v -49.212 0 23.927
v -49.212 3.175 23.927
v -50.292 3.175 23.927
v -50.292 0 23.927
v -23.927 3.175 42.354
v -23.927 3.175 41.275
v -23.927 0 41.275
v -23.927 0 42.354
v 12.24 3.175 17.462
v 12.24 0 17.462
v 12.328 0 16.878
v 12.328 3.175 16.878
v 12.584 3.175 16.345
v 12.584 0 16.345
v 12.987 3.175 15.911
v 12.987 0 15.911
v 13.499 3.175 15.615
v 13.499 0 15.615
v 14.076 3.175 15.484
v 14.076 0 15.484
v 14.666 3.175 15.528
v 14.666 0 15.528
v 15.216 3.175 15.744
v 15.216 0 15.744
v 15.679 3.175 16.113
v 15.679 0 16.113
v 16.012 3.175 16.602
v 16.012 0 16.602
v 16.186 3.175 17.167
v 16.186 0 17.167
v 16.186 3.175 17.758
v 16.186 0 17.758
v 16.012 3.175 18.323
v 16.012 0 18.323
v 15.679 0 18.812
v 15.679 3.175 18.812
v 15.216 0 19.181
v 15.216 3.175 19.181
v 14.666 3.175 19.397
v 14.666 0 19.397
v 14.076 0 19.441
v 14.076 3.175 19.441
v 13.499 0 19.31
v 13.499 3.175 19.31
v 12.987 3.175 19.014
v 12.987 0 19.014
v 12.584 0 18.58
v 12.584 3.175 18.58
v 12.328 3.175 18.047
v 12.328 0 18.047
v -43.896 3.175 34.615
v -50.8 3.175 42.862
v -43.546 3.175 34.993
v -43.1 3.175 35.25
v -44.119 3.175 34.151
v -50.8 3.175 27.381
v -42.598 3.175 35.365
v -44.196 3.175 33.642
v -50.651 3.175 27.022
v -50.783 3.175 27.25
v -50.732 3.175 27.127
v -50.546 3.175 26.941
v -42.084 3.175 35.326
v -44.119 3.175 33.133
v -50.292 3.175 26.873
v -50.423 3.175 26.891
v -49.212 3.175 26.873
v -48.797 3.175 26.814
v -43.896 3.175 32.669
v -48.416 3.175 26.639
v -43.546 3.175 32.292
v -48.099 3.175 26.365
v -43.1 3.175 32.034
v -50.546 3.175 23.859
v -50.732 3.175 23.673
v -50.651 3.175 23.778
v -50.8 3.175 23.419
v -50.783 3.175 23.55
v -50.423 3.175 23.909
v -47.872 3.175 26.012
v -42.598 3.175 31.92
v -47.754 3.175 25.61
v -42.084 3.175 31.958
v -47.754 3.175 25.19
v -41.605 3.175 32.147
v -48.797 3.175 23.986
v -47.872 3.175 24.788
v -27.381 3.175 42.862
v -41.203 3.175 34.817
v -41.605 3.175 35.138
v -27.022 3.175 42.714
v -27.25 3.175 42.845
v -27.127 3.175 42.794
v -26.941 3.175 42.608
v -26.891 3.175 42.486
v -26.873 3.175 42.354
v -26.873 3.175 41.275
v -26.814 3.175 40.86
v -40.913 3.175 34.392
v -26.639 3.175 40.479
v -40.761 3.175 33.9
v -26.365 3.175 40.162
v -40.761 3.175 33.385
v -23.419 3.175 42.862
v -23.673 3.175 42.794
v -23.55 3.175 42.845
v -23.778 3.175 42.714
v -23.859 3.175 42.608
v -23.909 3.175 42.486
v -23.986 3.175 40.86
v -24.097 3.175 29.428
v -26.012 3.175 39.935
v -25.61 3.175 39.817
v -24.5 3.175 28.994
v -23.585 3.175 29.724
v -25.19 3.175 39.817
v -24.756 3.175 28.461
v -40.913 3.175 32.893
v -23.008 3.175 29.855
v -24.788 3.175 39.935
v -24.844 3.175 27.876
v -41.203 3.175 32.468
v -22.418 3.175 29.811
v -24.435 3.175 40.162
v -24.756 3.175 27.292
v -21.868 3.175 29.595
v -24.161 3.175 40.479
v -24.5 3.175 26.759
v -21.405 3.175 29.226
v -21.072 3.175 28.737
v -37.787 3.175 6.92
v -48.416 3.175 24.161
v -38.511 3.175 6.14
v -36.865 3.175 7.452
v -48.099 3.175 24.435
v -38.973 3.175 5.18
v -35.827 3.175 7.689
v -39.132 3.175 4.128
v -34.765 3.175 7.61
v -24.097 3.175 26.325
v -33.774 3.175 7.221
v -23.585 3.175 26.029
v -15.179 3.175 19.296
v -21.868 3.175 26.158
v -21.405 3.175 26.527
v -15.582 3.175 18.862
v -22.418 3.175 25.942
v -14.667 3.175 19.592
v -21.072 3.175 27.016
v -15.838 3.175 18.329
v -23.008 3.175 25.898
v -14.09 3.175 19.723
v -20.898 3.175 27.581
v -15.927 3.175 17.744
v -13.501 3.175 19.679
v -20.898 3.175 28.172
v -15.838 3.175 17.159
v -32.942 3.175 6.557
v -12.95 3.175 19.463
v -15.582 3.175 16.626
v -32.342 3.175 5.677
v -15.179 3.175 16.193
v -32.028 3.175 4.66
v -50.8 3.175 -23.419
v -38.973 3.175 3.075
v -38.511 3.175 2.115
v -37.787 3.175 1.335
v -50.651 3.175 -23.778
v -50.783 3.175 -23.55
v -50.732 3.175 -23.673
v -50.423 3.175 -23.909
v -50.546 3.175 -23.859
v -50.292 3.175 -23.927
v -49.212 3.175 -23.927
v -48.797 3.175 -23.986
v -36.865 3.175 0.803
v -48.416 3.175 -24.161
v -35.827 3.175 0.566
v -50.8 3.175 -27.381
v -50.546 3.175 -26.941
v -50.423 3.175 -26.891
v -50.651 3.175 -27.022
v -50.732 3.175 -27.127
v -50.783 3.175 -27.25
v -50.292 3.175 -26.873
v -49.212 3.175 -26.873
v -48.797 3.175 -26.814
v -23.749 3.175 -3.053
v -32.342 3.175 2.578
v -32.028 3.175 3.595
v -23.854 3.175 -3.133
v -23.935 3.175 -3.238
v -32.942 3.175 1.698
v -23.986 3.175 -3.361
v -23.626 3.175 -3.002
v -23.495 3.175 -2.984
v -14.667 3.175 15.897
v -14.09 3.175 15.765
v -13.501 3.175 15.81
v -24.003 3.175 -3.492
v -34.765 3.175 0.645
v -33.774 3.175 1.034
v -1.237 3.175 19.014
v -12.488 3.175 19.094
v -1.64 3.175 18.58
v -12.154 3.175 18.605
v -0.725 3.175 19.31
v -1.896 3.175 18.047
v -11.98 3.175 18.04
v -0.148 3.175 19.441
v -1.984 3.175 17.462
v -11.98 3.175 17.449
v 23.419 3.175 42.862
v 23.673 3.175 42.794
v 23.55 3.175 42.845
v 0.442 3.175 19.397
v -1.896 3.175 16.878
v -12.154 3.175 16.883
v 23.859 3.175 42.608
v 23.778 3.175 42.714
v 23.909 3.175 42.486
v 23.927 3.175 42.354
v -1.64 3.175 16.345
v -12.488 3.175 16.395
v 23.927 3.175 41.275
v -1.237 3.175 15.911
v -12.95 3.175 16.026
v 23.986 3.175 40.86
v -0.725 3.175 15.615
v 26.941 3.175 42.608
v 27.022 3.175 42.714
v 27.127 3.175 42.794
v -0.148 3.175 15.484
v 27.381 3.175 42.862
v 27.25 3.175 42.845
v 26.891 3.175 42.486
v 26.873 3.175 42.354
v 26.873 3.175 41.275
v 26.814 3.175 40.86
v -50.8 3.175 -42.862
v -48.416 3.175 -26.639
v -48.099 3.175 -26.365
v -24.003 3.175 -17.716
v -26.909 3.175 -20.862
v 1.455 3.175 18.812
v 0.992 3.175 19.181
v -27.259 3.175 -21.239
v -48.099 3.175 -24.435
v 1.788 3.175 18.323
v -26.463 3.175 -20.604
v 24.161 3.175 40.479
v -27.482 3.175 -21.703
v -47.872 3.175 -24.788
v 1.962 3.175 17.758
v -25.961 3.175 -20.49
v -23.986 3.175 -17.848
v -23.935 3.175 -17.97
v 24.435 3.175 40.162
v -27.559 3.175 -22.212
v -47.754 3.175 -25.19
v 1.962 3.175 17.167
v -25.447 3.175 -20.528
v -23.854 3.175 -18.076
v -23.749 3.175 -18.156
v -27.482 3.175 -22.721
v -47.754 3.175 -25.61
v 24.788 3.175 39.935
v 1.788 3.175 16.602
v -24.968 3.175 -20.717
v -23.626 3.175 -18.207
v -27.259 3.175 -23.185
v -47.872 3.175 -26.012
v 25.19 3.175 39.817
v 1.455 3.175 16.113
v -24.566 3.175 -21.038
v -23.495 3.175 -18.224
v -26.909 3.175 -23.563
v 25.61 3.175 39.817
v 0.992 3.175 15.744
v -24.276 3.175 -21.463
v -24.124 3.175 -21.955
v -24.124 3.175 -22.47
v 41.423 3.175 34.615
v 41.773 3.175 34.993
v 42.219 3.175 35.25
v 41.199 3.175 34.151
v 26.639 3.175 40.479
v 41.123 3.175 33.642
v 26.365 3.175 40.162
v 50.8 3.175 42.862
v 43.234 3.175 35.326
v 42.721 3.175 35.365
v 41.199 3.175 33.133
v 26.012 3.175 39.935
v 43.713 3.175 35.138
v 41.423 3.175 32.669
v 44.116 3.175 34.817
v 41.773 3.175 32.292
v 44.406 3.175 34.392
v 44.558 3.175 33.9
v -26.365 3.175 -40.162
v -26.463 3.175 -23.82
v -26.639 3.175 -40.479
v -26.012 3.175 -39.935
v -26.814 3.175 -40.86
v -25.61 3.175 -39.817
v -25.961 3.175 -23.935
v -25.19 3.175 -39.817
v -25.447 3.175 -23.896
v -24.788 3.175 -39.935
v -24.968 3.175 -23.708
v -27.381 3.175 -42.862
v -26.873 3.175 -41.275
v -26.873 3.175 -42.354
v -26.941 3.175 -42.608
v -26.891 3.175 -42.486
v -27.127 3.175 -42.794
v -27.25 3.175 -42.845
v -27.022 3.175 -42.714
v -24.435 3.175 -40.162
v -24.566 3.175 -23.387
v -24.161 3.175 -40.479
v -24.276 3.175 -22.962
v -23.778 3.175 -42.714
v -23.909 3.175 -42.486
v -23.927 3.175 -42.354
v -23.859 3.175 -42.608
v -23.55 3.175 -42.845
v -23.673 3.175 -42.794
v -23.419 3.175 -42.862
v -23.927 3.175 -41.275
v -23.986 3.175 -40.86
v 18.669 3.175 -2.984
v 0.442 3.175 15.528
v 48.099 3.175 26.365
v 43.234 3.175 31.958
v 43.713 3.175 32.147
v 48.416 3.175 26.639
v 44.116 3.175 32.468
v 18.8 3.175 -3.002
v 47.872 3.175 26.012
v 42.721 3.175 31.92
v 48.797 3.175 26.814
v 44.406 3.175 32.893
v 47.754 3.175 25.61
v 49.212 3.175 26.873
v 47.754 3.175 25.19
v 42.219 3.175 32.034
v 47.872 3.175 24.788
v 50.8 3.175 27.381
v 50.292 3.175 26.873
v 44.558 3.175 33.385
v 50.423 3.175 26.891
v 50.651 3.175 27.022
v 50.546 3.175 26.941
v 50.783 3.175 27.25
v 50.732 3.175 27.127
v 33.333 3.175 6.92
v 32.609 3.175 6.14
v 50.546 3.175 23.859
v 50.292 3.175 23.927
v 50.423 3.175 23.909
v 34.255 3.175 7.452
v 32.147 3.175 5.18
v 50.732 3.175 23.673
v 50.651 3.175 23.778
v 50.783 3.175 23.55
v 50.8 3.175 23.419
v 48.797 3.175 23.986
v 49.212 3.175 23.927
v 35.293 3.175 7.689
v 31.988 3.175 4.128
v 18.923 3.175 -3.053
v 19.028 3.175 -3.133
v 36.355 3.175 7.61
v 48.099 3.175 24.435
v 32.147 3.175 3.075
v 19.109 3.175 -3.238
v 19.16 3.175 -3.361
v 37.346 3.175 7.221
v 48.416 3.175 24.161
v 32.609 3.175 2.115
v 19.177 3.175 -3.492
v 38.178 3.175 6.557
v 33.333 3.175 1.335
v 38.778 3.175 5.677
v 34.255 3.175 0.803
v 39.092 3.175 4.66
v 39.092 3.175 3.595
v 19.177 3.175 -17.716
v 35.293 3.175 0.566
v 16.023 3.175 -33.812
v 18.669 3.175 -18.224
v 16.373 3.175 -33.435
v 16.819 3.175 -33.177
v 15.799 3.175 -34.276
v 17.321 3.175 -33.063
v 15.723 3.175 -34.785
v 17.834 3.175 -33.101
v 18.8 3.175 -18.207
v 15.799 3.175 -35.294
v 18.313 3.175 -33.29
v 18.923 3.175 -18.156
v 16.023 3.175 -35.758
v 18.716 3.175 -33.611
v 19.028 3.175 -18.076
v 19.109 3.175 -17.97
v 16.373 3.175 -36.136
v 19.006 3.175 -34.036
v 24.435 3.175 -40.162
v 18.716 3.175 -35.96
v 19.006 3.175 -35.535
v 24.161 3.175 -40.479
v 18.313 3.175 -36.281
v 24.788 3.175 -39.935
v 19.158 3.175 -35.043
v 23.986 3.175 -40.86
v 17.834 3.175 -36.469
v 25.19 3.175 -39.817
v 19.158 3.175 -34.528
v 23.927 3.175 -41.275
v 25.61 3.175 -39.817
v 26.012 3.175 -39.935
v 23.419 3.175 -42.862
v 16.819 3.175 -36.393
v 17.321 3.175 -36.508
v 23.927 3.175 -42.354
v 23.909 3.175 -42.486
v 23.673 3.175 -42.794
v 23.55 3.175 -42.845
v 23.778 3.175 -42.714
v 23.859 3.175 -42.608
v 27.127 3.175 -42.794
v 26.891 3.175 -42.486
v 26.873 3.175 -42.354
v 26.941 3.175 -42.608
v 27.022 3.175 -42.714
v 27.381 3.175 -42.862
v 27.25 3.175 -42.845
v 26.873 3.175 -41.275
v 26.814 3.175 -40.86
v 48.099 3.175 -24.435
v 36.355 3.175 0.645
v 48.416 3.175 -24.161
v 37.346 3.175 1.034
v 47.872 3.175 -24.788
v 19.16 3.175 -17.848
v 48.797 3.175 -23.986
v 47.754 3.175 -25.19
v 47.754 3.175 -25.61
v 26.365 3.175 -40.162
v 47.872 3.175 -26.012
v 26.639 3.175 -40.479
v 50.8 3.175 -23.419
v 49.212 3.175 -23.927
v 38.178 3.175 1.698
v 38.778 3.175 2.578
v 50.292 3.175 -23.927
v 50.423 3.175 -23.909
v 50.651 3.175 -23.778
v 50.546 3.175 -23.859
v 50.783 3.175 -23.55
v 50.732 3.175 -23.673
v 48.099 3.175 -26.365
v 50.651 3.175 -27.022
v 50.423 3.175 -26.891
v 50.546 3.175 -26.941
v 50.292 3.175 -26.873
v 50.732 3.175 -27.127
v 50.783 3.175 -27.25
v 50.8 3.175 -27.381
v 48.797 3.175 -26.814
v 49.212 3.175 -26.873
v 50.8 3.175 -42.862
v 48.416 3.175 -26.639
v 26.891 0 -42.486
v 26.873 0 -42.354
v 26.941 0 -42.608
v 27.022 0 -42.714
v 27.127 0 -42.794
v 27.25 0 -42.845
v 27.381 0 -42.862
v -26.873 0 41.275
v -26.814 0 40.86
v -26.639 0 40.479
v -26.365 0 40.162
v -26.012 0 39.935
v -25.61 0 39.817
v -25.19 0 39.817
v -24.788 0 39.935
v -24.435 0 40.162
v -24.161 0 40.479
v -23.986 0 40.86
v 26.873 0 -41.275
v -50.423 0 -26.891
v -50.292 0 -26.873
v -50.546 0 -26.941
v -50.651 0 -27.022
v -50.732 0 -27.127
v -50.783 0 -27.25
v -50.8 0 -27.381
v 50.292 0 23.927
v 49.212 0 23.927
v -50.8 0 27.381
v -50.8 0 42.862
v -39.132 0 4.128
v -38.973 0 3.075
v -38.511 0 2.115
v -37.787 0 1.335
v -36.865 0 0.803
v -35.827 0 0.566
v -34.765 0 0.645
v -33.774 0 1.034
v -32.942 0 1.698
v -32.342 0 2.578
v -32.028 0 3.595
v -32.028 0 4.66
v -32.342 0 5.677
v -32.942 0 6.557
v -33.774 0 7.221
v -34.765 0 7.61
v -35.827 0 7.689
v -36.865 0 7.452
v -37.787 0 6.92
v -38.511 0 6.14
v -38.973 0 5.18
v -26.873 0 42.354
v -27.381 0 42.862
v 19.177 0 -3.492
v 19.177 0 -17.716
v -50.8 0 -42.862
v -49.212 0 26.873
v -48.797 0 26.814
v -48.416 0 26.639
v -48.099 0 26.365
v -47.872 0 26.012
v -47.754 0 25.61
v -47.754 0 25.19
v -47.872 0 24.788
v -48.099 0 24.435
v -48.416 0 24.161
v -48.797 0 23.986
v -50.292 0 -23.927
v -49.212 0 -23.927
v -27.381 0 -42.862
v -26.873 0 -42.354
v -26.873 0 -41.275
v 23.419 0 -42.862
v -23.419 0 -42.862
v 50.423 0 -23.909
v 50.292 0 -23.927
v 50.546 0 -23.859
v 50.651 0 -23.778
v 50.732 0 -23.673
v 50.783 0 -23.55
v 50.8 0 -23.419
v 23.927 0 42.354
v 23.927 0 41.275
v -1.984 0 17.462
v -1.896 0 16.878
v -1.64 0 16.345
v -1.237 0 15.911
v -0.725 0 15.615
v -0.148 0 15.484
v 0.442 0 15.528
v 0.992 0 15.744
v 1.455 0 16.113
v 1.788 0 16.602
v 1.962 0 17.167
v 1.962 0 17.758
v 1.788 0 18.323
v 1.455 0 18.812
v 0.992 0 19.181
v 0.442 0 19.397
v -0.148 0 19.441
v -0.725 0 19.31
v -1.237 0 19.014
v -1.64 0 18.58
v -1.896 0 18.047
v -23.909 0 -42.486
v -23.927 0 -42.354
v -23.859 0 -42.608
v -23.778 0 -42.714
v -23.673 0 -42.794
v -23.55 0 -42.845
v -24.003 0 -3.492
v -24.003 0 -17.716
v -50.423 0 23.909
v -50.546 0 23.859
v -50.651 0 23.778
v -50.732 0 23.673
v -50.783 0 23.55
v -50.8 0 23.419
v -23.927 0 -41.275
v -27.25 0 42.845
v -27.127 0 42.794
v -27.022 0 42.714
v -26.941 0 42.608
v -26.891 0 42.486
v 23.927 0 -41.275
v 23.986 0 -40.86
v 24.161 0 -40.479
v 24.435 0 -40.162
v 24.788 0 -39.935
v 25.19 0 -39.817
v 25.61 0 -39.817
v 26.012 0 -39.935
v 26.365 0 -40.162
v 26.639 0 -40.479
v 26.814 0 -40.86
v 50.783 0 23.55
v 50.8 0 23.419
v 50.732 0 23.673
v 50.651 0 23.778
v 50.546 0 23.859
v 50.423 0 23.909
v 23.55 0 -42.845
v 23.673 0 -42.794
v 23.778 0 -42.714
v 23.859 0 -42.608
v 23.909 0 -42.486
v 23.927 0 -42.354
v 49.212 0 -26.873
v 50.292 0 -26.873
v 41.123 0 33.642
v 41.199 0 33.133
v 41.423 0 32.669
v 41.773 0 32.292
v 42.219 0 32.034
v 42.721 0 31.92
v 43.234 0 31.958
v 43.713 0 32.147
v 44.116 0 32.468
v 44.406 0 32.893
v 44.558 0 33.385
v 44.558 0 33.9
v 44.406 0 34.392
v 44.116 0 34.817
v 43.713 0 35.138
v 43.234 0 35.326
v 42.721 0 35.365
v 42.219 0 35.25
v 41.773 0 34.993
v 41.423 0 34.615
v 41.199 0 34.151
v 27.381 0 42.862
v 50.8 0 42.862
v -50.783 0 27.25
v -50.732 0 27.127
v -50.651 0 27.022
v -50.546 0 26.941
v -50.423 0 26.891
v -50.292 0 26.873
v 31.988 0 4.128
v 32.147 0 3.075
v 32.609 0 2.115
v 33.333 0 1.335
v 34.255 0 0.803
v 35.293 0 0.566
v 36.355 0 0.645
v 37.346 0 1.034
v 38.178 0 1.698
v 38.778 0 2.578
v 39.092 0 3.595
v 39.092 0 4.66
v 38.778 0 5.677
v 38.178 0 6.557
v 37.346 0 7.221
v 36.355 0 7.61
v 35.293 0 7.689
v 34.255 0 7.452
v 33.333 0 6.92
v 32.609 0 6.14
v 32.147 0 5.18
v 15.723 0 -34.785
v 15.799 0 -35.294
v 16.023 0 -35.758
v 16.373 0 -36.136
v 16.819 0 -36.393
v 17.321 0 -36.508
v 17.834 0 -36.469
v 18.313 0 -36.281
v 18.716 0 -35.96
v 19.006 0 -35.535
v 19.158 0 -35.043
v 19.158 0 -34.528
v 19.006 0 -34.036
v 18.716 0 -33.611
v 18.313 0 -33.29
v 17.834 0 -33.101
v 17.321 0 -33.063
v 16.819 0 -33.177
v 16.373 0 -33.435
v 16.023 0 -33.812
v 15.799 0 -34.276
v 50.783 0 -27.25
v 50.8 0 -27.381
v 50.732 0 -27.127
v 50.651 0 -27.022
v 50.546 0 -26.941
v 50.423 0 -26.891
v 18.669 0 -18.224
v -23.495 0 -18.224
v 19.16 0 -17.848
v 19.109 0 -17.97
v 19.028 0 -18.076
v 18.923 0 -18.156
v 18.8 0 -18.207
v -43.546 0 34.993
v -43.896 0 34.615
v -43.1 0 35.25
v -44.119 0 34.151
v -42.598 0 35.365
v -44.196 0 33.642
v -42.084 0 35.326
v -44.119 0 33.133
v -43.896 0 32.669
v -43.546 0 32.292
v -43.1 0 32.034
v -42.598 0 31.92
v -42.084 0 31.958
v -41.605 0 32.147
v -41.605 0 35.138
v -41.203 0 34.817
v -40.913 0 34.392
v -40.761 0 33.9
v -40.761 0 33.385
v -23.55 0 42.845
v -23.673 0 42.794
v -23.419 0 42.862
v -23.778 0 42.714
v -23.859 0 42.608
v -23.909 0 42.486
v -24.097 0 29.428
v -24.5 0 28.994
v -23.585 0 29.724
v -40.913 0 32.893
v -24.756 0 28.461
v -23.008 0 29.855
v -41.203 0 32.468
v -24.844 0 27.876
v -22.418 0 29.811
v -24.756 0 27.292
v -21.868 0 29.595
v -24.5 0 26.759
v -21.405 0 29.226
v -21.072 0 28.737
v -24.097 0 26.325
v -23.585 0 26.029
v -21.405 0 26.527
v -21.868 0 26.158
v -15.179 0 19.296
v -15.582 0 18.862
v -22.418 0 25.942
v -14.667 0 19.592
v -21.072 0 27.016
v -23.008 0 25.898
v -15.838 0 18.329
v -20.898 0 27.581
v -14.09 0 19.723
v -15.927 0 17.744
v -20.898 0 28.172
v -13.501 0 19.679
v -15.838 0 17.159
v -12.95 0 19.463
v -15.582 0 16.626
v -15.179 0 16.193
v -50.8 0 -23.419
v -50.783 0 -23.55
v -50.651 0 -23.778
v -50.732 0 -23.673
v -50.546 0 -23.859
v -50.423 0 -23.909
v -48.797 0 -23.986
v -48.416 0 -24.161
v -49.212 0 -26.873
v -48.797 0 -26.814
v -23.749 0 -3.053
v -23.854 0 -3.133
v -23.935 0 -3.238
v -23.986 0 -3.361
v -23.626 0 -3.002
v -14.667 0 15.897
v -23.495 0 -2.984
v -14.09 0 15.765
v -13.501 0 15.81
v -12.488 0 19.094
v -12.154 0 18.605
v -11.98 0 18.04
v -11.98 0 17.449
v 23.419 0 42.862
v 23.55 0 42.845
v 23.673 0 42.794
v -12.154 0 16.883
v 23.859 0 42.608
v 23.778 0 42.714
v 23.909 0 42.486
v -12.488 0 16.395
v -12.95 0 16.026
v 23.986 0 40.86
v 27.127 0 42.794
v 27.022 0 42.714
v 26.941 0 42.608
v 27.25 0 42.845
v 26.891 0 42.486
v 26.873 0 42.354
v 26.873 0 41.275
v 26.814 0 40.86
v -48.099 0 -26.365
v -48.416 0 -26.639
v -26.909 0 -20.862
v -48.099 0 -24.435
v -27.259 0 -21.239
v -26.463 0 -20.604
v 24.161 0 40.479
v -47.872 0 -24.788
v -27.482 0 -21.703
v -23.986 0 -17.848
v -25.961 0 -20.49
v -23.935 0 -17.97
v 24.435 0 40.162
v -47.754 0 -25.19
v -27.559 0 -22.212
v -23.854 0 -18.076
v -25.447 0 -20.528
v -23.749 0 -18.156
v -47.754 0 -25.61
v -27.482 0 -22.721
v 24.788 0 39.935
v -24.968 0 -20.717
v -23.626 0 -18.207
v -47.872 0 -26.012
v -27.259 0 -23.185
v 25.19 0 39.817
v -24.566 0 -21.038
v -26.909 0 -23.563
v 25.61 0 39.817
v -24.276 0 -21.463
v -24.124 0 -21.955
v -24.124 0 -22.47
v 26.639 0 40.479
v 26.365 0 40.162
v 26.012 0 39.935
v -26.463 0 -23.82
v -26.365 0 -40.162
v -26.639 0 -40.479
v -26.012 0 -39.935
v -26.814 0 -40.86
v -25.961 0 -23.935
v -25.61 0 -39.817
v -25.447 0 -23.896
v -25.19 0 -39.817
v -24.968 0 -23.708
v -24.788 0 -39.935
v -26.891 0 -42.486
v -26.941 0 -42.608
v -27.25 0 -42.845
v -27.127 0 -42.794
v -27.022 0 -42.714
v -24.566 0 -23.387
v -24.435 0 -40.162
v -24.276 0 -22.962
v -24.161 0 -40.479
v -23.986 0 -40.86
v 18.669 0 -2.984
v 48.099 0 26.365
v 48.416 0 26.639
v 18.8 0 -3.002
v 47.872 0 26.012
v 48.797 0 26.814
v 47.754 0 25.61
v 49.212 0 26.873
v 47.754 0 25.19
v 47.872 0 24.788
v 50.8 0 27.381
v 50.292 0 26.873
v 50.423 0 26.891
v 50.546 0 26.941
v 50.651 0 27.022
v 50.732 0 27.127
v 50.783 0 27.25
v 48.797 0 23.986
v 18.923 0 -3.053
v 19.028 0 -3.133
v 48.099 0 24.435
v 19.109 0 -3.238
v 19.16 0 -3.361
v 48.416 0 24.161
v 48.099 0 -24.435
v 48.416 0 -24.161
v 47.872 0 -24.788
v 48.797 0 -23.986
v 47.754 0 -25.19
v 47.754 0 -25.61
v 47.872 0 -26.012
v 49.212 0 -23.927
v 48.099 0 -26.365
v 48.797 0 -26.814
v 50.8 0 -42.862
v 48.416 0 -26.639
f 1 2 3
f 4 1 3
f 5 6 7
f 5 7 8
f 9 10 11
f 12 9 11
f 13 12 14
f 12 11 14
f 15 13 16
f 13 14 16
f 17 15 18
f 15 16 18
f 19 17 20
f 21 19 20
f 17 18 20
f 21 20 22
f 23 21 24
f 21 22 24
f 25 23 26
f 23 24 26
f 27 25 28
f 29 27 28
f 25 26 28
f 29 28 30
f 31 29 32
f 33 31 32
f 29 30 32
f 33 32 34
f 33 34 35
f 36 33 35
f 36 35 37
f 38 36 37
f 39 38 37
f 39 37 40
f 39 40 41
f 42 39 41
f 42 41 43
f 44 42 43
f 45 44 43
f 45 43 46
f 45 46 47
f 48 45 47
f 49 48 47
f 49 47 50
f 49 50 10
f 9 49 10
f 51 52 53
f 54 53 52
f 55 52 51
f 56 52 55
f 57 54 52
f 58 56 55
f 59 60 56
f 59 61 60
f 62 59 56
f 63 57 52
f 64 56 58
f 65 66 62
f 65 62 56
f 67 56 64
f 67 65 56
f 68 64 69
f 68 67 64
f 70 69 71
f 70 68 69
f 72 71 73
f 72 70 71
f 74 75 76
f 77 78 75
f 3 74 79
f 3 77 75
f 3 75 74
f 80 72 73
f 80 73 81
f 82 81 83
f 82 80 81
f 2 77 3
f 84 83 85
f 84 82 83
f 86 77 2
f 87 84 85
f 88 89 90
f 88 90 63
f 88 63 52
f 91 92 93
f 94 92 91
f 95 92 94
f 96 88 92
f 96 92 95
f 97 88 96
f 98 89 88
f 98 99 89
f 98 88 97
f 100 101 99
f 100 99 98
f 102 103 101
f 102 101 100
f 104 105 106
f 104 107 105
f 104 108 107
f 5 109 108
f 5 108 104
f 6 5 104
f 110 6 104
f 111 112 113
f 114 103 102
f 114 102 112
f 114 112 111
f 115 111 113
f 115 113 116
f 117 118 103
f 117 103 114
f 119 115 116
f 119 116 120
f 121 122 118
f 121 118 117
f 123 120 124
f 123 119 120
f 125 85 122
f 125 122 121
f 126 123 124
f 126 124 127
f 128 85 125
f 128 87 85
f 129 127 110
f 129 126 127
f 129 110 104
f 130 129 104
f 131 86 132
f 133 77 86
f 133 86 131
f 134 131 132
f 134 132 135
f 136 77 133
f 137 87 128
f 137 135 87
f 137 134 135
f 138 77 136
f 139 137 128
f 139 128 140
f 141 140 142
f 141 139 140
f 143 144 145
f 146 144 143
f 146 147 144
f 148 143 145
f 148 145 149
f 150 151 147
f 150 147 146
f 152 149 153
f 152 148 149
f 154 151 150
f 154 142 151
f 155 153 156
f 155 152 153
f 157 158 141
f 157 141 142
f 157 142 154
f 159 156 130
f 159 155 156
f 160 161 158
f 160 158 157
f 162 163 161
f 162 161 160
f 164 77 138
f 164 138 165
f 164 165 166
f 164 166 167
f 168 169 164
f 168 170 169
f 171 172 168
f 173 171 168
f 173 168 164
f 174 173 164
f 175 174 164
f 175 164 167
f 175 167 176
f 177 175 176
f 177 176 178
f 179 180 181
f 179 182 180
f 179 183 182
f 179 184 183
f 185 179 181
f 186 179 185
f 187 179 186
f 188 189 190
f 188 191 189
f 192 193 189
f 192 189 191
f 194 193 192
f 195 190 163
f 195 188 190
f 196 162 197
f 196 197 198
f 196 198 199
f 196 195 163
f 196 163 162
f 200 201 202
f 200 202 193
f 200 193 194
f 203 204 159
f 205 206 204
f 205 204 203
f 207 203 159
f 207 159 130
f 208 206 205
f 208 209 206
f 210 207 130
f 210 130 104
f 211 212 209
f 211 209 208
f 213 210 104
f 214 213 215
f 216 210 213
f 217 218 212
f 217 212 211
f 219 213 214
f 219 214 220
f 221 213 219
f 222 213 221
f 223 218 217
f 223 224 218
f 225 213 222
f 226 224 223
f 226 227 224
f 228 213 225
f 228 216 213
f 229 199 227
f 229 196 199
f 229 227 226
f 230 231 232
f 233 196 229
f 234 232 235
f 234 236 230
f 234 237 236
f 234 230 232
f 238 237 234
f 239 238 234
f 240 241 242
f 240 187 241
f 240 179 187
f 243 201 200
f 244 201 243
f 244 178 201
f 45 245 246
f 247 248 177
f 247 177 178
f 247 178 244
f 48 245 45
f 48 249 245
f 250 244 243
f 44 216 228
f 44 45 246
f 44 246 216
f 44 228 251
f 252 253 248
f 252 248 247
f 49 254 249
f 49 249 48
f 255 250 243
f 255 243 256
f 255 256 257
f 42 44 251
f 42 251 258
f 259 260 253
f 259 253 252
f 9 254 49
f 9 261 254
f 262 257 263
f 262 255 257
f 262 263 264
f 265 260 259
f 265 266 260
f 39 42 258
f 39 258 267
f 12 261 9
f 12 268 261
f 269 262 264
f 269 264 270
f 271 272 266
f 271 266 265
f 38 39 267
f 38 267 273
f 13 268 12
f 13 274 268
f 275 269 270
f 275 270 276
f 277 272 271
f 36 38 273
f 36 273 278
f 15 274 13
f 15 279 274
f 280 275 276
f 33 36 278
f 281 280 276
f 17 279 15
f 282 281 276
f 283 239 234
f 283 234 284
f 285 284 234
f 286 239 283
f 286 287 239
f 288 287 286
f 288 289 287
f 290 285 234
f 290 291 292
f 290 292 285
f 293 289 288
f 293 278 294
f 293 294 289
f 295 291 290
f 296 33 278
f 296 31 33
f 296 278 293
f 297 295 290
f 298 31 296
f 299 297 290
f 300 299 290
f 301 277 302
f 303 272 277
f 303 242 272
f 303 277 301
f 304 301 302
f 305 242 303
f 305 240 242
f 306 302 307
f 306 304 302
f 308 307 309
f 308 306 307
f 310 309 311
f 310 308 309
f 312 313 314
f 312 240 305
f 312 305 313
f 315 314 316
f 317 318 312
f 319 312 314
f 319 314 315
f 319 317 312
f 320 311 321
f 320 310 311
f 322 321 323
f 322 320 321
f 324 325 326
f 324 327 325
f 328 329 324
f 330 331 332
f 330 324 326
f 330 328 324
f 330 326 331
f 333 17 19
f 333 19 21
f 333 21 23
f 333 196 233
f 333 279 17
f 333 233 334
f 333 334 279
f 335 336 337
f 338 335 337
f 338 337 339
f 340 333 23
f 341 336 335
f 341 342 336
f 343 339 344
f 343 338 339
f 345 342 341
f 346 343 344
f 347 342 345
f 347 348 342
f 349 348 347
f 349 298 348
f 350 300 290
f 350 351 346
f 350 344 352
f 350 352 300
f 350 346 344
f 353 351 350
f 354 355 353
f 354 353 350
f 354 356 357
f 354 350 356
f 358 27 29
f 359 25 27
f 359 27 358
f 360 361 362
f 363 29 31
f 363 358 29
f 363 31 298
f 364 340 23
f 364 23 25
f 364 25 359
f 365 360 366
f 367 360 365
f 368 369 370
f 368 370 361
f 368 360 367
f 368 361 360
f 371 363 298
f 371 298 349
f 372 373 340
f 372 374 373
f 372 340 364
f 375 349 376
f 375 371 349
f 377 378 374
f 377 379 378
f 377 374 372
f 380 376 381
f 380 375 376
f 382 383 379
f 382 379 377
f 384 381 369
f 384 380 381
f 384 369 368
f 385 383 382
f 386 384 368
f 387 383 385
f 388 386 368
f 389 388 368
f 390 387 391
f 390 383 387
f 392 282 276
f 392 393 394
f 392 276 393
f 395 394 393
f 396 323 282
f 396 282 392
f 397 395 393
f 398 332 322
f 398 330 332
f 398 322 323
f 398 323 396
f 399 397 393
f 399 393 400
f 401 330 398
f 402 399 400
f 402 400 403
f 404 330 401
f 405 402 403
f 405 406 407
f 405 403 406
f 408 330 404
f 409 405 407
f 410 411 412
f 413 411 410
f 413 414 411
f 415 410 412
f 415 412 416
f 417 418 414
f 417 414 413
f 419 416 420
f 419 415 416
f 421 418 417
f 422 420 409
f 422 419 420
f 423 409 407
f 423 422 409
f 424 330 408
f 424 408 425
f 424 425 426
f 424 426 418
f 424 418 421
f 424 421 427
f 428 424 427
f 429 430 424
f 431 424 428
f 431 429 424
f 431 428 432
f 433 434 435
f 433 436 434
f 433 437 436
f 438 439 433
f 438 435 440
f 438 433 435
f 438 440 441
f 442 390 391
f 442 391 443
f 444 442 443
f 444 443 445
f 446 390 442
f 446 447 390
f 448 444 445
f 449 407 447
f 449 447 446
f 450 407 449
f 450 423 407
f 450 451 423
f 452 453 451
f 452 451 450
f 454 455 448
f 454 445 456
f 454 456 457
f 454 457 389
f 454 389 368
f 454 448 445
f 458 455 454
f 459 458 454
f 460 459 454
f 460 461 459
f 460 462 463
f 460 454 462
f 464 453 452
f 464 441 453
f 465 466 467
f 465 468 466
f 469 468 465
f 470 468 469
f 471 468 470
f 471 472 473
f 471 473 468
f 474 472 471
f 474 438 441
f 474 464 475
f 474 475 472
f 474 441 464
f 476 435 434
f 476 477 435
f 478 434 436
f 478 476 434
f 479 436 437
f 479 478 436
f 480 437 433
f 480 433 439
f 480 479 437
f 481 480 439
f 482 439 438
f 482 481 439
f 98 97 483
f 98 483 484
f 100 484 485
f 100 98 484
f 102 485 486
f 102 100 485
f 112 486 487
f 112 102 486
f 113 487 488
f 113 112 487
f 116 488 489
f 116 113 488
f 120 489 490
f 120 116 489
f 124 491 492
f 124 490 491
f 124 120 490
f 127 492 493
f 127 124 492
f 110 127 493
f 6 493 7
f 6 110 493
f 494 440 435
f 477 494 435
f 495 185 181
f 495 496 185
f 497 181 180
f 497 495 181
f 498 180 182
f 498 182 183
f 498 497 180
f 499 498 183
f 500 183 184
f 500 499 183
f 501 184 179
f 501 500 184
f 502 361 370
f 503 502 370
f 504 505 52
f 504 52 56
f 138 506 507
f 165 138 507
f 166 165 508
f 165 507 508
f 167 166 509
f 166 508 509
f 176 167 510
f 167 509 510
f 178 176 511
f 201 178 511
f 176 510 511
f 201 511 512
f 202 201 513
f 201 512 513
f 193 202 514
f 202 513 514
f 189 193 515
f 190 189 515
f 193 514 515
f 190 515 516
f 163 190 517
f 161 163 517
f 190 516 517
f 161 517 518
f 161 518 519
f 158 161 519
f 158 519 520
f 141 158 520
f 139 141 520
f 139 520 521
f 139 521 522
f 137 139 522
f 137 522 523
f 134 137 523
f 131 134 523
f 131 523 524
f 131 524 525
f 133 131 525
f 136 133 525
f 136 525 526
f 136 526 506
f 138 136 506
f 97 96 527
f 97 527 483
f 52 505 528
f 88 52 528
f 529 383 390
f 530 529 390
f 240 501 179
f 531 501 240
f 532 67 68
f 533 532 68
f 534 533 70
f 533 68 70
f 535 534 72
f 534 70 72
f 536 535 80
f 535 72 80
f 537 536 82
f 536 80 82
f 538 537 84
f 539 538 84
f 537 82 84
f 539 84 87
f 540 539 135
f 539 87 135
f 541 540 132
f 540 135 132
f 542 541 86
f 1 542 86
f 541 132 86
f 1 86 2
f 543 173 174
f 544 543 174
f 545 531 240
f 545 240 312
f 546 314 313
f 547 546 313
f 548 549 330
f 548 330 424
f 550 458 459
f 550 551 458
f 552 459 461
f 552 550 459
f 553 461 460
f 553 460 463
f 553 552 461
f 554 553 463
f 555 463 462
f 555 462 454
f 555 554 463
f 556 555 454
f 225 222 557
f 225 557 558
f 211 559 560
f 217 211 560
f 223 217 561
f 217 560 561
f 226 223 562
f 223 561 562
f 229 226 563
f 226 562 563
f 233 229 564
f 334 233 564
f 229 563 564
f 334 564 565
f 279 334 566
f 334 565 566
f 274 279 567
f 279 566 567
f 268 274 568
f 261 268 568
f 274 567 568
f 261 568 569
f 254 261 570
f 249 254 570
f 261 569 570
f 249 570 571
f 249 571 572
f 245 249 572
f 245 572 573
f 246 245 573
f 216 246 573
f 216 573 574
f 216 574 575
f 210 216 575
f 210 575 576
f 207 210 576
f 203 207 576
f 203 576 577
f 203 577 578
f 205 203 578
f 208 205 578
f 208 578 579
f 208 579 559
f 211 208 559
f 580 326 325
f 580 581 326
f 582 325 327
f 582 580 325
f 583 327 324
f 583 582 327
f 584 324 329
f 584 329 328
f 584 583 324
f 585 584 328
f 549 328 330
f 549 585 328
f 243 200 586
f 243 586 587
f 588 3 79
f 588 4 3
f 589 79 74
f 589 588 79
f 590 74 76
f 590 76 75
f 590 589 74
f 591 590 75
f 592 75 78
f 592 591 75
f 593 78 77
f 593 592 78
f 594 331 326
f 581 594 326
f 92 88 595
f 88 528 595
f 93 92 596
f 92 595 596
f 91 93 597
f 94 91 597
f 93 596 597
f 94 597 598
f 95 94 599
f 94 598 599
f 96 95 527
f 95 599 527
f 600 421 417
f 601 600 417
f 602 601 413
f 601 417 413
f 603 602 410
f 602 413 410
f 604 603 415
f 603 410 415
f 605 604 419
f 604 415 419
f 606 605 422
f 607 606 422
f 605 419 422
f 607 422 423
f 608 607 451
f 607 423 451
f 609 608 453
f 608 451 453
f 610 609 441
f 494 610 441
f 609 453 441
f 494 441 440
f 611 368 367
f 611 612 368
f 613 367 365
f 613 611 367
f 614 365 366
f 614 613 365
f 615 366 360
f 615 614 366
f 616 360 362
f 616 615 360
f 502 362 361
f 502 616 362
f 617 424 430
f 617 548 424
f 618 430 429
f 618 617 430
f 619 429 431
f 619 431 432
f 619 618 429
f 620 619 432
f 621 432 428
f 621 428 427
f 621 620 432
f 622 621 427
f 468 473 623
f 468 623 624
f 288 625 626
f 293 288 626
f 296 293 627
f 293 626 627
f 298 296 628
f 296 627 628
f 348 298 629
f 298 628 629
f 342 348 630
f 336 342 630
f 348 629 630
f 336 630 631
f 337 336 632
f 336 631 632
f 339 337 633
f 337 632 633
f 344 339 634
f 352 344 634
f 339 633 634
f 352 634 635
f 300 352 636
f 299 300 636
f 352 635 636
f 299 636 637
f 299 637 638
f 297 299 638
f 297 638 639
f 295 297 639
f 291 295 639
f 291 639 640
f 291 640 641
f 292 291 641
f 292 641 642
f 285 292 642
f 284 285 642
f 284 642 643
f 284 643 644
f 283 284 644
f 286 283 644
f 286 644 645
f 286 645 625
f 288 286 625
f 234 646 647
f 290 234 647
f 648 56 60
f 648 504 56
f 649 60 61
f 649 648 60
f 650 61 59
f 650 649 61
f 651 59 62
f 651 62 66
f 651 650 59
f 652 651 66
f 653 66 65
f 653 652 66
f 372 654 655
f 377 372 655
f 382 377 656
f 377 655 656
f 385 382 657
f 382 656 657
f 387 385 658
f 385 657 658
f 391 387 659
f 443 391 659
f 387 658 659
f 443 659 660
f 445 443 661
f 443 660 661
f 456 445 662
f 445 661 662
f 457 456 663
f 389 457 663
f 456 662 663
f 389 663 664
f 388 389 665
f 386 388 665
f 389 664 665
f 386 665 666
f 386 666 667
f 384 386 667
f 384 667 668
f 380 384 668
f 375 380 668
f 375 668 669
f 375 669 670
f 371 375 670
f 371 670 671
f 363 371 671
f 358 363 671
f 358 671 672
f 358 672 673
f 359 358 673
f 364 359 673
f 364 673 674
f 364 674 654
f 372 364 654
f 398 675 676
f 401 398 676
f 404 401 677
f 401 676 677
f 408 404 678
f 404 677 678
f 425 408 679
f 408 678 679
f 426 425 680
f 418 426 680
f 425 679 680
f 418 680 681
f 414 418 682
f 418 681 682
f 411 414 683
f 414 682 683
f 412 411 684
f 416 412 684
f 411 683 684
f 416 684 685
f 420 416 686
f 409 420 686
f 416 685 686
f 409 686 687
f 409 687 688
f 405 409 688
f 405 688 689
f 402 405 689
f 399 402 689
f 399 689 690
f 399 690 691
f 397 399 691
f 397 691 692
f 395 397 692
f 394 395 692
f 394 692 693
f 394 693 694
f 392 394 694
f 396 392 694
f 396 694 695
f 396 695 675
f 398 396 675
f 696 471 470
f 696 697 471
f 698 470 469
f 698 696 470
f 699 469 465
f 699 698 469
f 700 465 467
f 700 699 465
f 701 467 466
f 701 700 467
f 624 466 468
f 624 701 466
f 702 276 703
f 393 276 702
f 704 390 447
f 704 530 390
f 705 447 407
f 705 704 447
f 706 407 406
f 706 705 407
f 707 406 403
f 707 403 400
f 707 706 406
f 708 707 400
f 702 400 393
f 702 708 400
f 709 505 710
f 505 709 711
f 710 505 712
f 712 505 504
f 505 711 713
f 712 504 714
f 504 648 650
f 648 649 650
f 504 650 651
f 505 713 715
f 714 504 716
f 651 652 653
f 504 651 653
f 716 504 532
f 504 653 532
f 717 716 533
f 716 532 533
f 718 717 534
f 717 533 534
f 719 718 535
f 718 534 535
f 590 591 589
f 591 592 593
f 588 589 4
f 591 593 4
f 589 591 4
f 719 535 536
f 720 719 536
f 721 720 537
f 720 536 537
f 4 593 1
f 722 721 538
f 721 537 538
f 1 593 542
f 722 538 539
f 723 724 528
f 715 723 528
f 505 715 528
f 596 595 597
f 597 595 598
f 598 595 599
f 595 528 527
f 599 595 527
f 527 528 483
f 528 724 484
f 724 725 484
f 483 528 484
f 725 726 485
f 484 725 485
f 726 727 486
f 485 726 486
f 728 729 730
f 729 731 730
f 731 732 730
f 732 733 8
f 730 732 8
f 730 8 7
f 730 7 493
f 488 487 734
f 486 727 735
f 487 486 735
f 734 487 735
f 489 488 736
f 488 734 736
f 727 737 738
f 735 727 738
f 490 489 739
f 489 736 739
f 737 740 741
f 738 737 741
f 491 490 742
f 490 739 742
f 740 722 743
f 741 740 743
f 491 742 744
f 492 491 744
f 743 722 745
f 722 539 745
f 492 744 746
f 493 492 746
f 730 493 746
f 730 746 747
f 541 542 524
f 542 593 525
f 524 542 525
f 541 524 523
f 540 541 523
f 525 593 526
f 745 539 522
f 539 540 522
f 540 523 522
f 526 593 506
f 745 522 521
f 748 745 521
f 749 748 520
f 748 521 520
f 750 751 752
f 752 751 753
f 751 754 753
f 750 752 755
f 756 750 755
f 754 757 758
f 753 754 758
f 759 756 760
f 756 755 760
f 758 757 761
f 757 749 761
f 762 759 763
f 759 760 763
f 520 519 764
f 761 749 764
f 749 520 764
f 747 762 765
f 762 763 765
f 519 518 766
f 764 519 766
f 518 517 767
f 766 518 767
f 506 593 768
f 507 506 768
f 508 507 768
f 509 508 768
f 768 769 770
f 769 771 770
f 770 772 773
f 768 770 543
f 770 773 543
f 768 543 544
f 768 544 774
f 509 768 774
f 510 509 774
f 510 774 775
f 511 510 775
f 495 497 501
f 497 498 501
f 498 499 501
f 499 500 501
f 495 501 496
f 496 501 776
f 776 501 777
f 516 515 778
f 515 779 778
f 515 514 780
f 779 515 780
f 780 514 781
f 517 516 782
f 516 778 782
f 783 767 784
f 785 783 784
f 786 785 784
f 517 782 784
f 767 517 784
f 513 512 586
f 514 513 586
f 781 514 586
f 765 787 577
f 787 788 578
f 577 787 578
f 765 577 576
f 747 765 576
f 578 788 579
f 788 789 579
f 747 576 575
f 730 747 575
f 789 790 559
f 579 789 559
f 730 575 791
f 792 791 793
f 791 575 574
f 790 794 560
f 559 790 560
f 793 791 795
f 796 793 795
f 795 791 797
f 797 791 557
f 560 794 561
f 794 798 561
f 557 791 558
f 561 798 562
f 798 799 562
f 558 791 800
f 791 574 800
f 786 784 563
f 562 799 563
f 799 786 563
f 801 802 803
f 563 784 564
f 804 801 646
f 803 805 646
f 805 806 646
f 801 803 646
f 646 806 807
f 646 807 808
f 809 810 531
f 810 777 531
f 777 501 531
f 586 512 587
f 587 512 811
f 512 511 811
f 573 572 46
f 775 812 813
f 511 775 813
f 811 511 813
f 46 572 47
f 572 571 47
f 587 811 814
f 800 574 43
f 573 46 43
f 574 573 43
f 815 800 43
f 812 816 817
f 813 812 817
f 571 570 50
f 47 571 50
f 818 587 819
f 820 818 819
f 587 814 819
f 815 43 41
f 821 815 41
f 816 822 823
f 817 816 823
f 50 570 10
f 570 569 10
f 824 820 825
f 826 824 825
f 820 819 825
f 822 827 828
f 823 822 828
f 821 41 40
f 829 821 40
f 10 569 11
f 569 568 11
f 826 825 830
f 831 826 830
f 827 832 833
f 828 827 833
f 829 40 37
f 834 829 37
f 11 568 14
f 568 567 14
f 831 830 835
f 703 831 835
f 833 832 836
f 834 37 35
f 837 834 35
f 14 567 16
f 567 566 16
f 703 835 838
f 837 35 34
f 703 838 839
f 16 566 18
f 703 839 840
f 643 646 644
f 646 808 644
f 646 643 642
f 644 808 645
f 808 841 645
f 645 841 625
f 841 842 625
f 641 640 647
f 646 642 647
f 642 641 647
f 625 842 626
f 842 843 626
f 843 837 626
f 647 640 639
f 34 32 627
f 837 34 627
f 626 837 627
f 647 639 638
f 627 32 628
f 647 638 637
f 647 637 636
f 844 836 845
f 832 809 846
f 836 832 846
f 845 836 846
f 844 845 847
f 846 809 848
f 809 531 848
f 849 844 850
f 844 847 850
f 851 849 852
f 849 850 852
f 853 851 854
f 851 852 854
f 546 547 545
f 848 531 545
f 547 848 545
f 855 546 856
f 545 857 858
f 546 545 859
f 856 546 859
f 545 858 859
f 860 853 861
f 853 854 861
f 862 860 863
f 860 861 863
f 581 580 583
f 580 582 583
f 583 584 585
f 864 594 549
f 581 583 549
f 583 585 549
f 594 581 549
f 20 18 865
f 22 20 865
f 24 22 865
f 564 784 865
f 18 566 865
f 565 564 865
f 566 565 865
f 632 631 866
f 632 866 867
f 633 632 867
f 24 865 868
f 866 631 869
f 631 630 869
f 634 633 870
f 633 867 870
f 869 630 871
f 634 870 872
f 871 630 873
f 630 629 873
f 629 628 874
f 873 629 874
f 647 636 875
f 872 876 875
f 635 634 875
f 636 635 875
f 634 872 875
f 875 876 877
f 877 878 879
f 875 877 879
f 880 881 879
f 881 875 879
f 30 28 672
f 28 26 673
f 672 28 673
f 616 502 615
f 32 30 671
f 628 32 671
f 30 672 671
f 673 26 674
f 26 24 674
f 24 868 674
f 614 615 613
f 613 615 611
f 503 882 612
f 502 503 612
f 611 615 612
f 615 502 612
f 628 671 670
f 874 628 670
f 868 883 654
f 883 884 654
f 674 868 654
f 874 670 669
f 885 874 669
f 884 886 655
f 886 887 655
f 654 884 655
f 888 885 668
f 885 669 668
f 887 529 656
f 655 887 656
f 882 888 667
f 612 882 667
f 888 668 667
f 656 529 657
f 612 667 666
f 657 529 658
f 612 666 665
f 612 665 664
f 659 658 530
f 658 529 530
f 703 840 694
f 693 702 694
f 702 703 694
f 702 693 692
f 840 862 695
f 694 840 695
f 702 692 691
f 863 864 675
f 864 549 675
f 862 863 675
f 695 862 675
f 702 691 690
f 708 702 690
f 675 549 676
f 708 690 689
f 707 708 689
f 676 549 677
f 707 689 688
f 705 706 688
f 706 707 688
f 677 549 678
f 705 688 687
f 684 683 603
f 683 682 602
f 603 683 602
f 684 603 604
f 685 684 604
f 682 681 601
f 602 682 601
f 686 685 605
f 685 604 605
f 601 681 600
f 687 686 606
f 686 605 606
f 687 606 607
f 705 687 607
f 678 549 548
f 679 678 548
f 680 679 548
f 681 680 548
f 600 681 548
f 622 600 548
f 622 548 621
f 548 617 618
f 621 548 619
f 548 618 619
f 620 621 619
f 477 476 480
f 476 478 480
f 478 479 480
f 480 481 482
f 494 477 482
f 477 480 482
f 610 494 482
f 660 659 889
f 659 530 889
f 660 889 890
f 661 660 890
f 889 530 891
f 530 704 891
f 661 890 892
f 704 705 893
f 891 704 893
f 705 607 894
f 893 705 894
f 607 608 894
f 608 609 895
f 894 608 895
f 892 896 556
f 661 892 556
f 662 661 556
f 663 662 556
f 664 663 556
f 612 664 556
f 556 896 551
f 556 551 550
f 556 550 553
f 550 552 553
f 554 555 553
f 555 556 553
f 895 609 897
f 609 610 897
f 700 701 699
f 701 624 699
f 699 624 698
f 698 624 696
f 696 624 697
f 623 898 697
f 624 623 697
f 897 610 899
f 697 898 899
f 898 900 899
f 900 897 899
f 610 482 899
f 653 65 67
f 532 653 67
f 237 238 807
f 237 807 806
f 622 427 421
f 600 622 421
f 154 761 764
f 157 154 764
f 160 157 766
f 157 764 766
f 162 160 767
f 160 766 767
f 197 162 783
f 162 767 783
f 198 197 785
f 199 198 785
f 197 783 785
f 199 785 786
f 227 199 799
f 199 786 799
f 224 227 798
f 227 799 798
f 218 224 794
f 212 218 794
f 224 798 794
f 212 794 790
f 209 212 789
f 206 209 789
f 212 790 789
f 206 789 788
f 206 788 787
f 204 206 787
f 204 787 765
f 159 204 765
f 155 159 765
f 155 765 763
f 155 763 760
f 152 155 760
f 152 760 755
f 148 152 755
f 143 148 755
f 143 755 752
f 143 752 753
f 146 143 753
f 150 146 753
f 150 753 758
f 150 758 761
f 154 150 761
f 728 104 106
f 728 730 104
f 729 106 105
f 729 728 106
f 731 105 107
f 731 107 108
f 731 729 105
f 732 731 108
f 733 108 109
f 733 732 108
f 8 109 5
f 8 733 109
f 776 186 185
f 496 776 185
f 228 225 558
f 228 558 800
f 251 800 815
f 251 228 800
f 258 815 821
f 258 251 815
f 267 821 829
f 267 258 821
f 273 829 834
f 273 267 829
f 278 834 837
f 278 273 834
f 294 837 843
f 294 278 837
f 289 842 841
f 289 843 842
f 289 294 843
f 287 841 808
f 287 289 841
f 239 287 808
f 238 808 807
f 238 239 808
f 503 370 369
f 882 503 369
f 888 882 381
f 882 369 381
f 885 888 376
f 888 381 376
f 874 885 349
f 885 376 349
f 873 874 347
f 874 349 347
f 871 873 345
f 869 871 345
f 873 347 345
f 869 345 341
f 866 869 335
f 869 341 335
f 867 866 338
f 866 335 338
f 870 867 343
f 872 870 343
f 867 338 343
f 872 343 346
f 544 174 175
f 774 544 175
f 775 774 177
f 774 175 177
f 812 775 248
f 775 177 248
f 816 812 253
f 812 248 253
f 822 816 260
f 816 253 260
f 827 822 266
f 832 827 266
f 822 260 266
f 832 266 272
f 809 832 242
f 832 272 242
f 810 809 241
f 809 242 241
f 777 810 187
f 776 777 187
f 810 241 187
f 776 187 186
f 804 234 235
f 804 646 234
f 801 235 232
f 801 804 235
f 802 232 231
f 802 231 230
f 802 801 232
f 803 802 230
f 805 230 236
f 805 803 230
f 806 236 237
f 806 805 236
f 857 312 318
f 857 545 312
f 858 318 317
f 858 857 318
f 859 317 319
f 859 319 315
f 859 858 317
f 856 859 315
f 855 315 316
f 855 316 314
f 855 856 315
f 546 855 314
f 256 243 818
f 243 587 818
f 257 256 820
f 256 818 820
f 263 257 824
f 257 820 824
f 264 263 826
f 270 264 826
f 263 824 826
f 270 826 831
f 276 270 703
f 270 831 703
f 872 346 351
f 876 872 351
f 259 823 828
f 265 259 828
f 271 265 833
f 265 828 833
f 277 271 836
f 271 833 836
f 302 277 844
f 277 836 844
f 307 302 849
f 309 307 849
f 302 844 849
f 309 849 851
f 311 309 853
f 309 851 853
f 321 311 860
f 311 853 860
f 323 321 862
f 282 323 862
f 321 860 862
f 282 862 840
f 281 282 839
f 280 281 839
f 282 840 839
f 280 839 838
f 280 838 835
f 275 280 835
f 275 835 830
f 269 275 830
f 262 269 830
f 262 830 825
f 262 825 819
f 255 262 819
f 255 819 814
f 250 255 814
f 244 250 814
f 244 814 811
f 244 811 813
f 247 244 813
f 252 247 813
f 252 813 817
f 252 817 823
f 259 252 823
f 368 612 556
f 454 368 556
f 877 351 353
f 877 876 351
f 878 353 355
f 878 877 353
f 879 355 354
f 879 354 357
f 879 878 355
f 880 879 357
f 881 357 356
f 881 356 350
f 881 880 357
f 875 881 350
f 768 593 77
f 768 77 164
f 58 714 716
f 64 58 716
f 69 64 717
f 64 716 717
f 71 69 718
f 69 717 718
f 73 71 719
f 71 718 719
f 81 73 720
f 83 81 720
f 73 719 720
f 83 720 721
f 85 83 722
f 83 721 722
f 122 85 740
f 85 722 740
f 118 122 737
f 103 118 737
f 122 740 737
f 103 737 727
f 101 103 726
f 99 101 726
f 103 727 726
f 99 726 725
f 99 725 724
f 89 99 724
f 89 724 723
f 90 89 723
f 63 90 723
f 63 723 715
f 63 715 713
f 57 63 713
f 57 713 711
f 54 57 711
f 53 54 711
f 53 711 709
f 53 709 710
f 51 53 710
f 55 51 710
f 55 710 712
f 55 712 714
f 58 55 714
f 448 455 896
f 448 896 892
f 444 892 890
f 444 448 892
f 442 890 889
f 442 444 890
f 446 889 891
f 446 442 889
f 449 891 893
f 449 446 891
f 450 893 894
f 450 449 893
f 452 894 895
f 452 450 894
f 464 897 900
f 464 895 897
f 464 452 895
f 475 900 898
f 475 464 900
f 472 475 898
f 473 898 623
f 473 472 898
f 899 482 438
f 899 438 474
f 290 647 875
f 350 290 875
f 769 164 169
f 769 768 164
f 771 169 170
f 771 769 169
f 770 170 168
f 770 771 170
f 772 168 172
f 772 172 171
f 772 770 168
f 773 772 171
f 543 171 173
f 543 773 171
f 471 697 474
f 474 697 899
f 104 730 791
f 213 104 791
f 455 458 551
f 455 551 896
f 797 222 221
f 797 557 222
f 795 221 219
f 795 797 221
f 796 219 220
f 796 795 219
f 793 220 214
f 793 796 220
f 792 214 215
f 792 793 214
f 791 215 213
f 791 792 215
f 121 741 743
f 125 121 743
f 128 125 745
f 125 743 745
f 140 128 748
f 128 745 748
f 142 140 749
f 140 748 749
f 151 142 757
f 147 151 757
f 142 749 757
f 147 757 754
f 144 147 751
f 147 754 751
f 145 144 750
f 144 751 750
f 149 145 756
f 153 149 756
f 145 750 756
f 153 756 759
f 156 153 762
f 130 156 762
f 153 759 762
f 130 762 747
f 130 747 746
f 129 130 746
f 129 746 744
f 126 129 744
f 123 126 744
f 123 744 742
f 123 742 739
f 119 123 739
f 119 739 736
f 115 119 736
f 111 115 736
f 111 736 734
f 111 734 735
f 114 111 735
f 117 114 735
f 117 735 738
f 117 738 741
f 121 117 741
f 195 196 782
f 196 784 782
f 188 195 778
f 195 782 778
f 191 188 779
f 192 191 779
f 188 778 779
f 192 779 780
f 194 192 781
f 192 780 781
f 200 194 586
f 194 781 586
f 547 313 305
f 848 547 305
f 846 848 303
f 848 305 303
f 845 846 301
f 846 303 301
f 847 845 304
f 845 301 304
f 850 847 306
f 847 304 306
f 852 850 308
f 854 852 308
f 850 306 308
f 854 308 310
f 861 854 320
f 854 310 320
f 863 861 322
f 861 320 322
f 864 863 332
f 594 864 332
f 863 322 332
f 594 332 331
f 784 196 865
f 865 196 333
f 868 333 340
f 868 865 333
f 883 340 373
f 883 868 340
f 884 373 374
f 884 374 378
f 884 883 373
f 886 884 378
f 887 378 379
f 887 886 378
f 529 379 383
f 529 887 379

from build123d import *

# Parameters (mm, degrees)
SKETCH1_W                       = 101.6
SKETCH1_H                       = 85.725
BOSS_EXTRUDE1_DEPTH             = 3.175
F_29_0_136_DIAMETER_HOLE1_D     = 3.4544
F_9_32_0_28125_DIAMETER_HOLE1_D = 7.14375
F_5_32_0_15625_DIAMETER_HOLE1_D = 3.96875
SKETCH8_W                       = 43.18
SKETCH8_H                       = 15.24
CUT_EXTRUDE1_DEPTH              = 67.542576831
CUT_EXTRUDE2_DEPTH              = 67.542576831
FILLET1_R                       = 0.508
CUT_EXTRUDE3_DEPTH              = 67.542576831
FILLET2_R                       = 0.508


with BuildPart() as part:
    # Sketch1 → Boss-Extrude1 (new body)
    with BuildSketch(Plane(origin=(0, 0, 0), x_dir=(1, 0, 0), z_dir=(0, 1, 0))):
        Rectangle(SKETCH1_W, SKETCH1_H)
    extrude(amount=BOSS_EXTRUDE1_DEPTH)

    # #29 (0.136) Diameter Hole1 (through all)
    with Locations(Plane(origin=(0, 3.175, 0), x_dir=(1, 0, 0), z_dir=(0, 1, 0))):
        with Locations((-25.8318, 22.2123), (17.4498, 34.7853), (42.8498, -33.6423), (-42.4688, -33.6423)):
            Hole(F_29_0_136_DIAMETER_HOLE1_D / 2)

    # 9/32 (0.28125) Diameter Hole1 (through all)
    with Locations(Plane(origin=(0, 3.175, 0), x_dir=(1, 0, 0), z_dir=(0, 1, 0))):
        with Locations((-35.56, -4.1275), (35.56, -4.1275)):
            Hole(F_9_32_0_28125_DIAMETER_HOLE1_D / 2)

    # 5/32 (0.15625) Diameter Hole1 (through all)
    with Locations(Plane(origin=(0, 3.175, 0), x_dir=(1, 0, 0), z_dir=(0, 1, 0))):
        with Locations((-22.86, -27.8765), (-13.942192497, -17.744307503), (0, -17.4625), (14.224, -17.4625)):
            Hole(F_5_32_0_15625_DIAMETER_HOLE1_D / 2)

    # Sketch8 → Cut-Extrude1 (cut, through all)
    with BuildSketch(Plane(origin=(0, 3.175, 0), x_dir=(1, 0, 0), z_dir=(0, 1, 0))):
        with Locations((-2.413, 10.6045)):
            Rectangle(SKETCH8_W, SKETCH8_H)
    extrude(amount=-CUT_EXTRUDE1_DEPTH, mode=Mode.SUBTRACT)

    # Sketch9 → Cut-Extrude2 (cut, through all)
    with BuildSketch(Plane(origin=(0, 3.175, 0), x_dir=(1, 0, 0), z_dir=(0, 1, 0))):
        with BuildLine():
            Line((-49.2125, 26.8732), (-50.8, 26.8732))
            Line((-50.8, 26.8732), (-50.8, 23.9268))
            Line((-50.8, 23.9268), (-49.2125, 23.9268))
            ThreePointArc((-49.2125, 23.9268), (-47.7393, 25.4), (-49.2125, 26.8732))
        make_face()
        with BuildLine():
            Line((-49.2125, -23.9268), (-50.8, -23.9268))
            Line((-50.8, -23.9268), (-50.8, -26.8732))
            Line((-50.8, -26.8732), (-49.2125, -26.8732))
            ThreePointArc((-49.2125, -26.8732), (-47.7393, -25.4), (-49.2125, -23.9268))
        make_face()
        with BuildLine():
            Line((49.2125, -26.8732), (50.8, -26.8732))
            Line((50.8, -26.8732), (50.8, -23.9268))
            Line((50.8, -23.9268), (49.2125, -23.9268))
            ThreePointArc((49.2125, -23.9268), (47.7393, -25.4), (49.2125, -26.8732))
        make_face()
        with BuildLine():
            Line((50.8, 26.8732), (50.8, 23.9268))
            Line((50.8, 23.9268), (49.2125, 23.9268))
            ThreePointArc((49.2125, 23.9268), (47.7393, 25.4), (49.2125, 26.8732))
            Line((49.2125, 26.8732), (50.8, 26.8732))
        make_face()
    extrude(amount=-CUT_EXTRUDE2_DEPTH, mode=Mode.SUBTRACT)

    # Fillet1
    fillet1_edges = [part.edges().sort_by_distance(p)[0] for p in [
        (-50.8, 1.5875, -26.8732),
        (-50.8, 1.5875, 26.8732),
        (-50.8, 1.5875, 23.9268),
        (50.8, 1.5875, 23.9268),
        (50.8, 1.5875, 26.8732),
        (50.8, 1.5875, -26.8732),
        (50.8, 1.5875, -23.9268),
        (-24.003, 1.5875, -2.9845),
        (-24.003, 1.5875, -18.2245),
        (19.177, 1.5875, -18.2245),
        (19.177, 1.5875, -2.9845),
        (-50.8, 1.5875, -23.9268),
    ]]
    fillet(fillet1_edges, radius=FILLET1_R)

    # Sketch10 → Cut-Extrude3 (cut, through all)
    with BuildSketch(Plane(origin=(0, 3.175, 0), x_dir=(1, 0, 0), z_dir=(0, 1, 0))):
        with BuildLine():
            Line((-23.9268, 41.275), (-23.9268, 42.8625))
            Line((-23.9268, 42.8625), (-26.8732, 42.8625))
            Line((-26.8732, 42.8625), (-26.8732, 41.275))
            ThreePointArc((-26.8732, 41.275), (-25.4, 39.8018), (-23.9268, 41.275))
        make_face()
        with BuildLine():
            Line((26.8732, -41.275), (26.8732, -42.8625))
            Line((26.8732, -42.8625), (23.9268, -42.8625))
            Line((23.9268, -42.8625), (23.9268, -41.275))
            ThreePointArc((23.9268, -41.275), (25.4, -39.8018), (26.8732, -41.275))
        make_face()
        with BuildLine():
            Line((-23.9268, -41.275), (-23.9268, -42.8625))
            Line((-23.9268, -42.8625), (-26.8732, -42.8625))
            Line((-26.8732, -42.8625), (-26.8732, -41.275))
            ThreePointArc((-26.8732, -41.275), (-25.4, -39.8018), (-23.9268, -41.275))
        make_face()
        with BuildLine():
            Line((26.8732, 42.8625), (23.9268, 42.8625))
            Line((23.9268, 42.8625), (23.9268, 41.275))
            ThreePointArc((23.9268, 41.275), (25.4, 39.8018), (26.8732, 41.275))
            Line((26.8732, 41.275), (26.8732, 42.8625))
        make_face()
    extrude(amount=-CUT_EXTRUDE3_DEPTH, mode=Mode.SUBTRACT)

    # Fillet2
    fillet2_edges = [part.edges().sort_by_distance(p)[0] for p in [
        (-26.8732, 1.5875, -42.8625),
        (-23.9268, 1.5875, -42.8625),
        (26.8732, 1.5875, -42.8625),
        (23.9268, 1.5875, -42.8625),
        (-23.9268, 1.5875, 42.8625),
        (-26.8732, 1.5875, 42.8625),
        (26.8732, 1.5875, 42.8625),
        (23.9268, 1.5875, 42.8625),
    ]]
    fillet(fillet2_edges, radius=FILLET2_R)


solid = part.part
